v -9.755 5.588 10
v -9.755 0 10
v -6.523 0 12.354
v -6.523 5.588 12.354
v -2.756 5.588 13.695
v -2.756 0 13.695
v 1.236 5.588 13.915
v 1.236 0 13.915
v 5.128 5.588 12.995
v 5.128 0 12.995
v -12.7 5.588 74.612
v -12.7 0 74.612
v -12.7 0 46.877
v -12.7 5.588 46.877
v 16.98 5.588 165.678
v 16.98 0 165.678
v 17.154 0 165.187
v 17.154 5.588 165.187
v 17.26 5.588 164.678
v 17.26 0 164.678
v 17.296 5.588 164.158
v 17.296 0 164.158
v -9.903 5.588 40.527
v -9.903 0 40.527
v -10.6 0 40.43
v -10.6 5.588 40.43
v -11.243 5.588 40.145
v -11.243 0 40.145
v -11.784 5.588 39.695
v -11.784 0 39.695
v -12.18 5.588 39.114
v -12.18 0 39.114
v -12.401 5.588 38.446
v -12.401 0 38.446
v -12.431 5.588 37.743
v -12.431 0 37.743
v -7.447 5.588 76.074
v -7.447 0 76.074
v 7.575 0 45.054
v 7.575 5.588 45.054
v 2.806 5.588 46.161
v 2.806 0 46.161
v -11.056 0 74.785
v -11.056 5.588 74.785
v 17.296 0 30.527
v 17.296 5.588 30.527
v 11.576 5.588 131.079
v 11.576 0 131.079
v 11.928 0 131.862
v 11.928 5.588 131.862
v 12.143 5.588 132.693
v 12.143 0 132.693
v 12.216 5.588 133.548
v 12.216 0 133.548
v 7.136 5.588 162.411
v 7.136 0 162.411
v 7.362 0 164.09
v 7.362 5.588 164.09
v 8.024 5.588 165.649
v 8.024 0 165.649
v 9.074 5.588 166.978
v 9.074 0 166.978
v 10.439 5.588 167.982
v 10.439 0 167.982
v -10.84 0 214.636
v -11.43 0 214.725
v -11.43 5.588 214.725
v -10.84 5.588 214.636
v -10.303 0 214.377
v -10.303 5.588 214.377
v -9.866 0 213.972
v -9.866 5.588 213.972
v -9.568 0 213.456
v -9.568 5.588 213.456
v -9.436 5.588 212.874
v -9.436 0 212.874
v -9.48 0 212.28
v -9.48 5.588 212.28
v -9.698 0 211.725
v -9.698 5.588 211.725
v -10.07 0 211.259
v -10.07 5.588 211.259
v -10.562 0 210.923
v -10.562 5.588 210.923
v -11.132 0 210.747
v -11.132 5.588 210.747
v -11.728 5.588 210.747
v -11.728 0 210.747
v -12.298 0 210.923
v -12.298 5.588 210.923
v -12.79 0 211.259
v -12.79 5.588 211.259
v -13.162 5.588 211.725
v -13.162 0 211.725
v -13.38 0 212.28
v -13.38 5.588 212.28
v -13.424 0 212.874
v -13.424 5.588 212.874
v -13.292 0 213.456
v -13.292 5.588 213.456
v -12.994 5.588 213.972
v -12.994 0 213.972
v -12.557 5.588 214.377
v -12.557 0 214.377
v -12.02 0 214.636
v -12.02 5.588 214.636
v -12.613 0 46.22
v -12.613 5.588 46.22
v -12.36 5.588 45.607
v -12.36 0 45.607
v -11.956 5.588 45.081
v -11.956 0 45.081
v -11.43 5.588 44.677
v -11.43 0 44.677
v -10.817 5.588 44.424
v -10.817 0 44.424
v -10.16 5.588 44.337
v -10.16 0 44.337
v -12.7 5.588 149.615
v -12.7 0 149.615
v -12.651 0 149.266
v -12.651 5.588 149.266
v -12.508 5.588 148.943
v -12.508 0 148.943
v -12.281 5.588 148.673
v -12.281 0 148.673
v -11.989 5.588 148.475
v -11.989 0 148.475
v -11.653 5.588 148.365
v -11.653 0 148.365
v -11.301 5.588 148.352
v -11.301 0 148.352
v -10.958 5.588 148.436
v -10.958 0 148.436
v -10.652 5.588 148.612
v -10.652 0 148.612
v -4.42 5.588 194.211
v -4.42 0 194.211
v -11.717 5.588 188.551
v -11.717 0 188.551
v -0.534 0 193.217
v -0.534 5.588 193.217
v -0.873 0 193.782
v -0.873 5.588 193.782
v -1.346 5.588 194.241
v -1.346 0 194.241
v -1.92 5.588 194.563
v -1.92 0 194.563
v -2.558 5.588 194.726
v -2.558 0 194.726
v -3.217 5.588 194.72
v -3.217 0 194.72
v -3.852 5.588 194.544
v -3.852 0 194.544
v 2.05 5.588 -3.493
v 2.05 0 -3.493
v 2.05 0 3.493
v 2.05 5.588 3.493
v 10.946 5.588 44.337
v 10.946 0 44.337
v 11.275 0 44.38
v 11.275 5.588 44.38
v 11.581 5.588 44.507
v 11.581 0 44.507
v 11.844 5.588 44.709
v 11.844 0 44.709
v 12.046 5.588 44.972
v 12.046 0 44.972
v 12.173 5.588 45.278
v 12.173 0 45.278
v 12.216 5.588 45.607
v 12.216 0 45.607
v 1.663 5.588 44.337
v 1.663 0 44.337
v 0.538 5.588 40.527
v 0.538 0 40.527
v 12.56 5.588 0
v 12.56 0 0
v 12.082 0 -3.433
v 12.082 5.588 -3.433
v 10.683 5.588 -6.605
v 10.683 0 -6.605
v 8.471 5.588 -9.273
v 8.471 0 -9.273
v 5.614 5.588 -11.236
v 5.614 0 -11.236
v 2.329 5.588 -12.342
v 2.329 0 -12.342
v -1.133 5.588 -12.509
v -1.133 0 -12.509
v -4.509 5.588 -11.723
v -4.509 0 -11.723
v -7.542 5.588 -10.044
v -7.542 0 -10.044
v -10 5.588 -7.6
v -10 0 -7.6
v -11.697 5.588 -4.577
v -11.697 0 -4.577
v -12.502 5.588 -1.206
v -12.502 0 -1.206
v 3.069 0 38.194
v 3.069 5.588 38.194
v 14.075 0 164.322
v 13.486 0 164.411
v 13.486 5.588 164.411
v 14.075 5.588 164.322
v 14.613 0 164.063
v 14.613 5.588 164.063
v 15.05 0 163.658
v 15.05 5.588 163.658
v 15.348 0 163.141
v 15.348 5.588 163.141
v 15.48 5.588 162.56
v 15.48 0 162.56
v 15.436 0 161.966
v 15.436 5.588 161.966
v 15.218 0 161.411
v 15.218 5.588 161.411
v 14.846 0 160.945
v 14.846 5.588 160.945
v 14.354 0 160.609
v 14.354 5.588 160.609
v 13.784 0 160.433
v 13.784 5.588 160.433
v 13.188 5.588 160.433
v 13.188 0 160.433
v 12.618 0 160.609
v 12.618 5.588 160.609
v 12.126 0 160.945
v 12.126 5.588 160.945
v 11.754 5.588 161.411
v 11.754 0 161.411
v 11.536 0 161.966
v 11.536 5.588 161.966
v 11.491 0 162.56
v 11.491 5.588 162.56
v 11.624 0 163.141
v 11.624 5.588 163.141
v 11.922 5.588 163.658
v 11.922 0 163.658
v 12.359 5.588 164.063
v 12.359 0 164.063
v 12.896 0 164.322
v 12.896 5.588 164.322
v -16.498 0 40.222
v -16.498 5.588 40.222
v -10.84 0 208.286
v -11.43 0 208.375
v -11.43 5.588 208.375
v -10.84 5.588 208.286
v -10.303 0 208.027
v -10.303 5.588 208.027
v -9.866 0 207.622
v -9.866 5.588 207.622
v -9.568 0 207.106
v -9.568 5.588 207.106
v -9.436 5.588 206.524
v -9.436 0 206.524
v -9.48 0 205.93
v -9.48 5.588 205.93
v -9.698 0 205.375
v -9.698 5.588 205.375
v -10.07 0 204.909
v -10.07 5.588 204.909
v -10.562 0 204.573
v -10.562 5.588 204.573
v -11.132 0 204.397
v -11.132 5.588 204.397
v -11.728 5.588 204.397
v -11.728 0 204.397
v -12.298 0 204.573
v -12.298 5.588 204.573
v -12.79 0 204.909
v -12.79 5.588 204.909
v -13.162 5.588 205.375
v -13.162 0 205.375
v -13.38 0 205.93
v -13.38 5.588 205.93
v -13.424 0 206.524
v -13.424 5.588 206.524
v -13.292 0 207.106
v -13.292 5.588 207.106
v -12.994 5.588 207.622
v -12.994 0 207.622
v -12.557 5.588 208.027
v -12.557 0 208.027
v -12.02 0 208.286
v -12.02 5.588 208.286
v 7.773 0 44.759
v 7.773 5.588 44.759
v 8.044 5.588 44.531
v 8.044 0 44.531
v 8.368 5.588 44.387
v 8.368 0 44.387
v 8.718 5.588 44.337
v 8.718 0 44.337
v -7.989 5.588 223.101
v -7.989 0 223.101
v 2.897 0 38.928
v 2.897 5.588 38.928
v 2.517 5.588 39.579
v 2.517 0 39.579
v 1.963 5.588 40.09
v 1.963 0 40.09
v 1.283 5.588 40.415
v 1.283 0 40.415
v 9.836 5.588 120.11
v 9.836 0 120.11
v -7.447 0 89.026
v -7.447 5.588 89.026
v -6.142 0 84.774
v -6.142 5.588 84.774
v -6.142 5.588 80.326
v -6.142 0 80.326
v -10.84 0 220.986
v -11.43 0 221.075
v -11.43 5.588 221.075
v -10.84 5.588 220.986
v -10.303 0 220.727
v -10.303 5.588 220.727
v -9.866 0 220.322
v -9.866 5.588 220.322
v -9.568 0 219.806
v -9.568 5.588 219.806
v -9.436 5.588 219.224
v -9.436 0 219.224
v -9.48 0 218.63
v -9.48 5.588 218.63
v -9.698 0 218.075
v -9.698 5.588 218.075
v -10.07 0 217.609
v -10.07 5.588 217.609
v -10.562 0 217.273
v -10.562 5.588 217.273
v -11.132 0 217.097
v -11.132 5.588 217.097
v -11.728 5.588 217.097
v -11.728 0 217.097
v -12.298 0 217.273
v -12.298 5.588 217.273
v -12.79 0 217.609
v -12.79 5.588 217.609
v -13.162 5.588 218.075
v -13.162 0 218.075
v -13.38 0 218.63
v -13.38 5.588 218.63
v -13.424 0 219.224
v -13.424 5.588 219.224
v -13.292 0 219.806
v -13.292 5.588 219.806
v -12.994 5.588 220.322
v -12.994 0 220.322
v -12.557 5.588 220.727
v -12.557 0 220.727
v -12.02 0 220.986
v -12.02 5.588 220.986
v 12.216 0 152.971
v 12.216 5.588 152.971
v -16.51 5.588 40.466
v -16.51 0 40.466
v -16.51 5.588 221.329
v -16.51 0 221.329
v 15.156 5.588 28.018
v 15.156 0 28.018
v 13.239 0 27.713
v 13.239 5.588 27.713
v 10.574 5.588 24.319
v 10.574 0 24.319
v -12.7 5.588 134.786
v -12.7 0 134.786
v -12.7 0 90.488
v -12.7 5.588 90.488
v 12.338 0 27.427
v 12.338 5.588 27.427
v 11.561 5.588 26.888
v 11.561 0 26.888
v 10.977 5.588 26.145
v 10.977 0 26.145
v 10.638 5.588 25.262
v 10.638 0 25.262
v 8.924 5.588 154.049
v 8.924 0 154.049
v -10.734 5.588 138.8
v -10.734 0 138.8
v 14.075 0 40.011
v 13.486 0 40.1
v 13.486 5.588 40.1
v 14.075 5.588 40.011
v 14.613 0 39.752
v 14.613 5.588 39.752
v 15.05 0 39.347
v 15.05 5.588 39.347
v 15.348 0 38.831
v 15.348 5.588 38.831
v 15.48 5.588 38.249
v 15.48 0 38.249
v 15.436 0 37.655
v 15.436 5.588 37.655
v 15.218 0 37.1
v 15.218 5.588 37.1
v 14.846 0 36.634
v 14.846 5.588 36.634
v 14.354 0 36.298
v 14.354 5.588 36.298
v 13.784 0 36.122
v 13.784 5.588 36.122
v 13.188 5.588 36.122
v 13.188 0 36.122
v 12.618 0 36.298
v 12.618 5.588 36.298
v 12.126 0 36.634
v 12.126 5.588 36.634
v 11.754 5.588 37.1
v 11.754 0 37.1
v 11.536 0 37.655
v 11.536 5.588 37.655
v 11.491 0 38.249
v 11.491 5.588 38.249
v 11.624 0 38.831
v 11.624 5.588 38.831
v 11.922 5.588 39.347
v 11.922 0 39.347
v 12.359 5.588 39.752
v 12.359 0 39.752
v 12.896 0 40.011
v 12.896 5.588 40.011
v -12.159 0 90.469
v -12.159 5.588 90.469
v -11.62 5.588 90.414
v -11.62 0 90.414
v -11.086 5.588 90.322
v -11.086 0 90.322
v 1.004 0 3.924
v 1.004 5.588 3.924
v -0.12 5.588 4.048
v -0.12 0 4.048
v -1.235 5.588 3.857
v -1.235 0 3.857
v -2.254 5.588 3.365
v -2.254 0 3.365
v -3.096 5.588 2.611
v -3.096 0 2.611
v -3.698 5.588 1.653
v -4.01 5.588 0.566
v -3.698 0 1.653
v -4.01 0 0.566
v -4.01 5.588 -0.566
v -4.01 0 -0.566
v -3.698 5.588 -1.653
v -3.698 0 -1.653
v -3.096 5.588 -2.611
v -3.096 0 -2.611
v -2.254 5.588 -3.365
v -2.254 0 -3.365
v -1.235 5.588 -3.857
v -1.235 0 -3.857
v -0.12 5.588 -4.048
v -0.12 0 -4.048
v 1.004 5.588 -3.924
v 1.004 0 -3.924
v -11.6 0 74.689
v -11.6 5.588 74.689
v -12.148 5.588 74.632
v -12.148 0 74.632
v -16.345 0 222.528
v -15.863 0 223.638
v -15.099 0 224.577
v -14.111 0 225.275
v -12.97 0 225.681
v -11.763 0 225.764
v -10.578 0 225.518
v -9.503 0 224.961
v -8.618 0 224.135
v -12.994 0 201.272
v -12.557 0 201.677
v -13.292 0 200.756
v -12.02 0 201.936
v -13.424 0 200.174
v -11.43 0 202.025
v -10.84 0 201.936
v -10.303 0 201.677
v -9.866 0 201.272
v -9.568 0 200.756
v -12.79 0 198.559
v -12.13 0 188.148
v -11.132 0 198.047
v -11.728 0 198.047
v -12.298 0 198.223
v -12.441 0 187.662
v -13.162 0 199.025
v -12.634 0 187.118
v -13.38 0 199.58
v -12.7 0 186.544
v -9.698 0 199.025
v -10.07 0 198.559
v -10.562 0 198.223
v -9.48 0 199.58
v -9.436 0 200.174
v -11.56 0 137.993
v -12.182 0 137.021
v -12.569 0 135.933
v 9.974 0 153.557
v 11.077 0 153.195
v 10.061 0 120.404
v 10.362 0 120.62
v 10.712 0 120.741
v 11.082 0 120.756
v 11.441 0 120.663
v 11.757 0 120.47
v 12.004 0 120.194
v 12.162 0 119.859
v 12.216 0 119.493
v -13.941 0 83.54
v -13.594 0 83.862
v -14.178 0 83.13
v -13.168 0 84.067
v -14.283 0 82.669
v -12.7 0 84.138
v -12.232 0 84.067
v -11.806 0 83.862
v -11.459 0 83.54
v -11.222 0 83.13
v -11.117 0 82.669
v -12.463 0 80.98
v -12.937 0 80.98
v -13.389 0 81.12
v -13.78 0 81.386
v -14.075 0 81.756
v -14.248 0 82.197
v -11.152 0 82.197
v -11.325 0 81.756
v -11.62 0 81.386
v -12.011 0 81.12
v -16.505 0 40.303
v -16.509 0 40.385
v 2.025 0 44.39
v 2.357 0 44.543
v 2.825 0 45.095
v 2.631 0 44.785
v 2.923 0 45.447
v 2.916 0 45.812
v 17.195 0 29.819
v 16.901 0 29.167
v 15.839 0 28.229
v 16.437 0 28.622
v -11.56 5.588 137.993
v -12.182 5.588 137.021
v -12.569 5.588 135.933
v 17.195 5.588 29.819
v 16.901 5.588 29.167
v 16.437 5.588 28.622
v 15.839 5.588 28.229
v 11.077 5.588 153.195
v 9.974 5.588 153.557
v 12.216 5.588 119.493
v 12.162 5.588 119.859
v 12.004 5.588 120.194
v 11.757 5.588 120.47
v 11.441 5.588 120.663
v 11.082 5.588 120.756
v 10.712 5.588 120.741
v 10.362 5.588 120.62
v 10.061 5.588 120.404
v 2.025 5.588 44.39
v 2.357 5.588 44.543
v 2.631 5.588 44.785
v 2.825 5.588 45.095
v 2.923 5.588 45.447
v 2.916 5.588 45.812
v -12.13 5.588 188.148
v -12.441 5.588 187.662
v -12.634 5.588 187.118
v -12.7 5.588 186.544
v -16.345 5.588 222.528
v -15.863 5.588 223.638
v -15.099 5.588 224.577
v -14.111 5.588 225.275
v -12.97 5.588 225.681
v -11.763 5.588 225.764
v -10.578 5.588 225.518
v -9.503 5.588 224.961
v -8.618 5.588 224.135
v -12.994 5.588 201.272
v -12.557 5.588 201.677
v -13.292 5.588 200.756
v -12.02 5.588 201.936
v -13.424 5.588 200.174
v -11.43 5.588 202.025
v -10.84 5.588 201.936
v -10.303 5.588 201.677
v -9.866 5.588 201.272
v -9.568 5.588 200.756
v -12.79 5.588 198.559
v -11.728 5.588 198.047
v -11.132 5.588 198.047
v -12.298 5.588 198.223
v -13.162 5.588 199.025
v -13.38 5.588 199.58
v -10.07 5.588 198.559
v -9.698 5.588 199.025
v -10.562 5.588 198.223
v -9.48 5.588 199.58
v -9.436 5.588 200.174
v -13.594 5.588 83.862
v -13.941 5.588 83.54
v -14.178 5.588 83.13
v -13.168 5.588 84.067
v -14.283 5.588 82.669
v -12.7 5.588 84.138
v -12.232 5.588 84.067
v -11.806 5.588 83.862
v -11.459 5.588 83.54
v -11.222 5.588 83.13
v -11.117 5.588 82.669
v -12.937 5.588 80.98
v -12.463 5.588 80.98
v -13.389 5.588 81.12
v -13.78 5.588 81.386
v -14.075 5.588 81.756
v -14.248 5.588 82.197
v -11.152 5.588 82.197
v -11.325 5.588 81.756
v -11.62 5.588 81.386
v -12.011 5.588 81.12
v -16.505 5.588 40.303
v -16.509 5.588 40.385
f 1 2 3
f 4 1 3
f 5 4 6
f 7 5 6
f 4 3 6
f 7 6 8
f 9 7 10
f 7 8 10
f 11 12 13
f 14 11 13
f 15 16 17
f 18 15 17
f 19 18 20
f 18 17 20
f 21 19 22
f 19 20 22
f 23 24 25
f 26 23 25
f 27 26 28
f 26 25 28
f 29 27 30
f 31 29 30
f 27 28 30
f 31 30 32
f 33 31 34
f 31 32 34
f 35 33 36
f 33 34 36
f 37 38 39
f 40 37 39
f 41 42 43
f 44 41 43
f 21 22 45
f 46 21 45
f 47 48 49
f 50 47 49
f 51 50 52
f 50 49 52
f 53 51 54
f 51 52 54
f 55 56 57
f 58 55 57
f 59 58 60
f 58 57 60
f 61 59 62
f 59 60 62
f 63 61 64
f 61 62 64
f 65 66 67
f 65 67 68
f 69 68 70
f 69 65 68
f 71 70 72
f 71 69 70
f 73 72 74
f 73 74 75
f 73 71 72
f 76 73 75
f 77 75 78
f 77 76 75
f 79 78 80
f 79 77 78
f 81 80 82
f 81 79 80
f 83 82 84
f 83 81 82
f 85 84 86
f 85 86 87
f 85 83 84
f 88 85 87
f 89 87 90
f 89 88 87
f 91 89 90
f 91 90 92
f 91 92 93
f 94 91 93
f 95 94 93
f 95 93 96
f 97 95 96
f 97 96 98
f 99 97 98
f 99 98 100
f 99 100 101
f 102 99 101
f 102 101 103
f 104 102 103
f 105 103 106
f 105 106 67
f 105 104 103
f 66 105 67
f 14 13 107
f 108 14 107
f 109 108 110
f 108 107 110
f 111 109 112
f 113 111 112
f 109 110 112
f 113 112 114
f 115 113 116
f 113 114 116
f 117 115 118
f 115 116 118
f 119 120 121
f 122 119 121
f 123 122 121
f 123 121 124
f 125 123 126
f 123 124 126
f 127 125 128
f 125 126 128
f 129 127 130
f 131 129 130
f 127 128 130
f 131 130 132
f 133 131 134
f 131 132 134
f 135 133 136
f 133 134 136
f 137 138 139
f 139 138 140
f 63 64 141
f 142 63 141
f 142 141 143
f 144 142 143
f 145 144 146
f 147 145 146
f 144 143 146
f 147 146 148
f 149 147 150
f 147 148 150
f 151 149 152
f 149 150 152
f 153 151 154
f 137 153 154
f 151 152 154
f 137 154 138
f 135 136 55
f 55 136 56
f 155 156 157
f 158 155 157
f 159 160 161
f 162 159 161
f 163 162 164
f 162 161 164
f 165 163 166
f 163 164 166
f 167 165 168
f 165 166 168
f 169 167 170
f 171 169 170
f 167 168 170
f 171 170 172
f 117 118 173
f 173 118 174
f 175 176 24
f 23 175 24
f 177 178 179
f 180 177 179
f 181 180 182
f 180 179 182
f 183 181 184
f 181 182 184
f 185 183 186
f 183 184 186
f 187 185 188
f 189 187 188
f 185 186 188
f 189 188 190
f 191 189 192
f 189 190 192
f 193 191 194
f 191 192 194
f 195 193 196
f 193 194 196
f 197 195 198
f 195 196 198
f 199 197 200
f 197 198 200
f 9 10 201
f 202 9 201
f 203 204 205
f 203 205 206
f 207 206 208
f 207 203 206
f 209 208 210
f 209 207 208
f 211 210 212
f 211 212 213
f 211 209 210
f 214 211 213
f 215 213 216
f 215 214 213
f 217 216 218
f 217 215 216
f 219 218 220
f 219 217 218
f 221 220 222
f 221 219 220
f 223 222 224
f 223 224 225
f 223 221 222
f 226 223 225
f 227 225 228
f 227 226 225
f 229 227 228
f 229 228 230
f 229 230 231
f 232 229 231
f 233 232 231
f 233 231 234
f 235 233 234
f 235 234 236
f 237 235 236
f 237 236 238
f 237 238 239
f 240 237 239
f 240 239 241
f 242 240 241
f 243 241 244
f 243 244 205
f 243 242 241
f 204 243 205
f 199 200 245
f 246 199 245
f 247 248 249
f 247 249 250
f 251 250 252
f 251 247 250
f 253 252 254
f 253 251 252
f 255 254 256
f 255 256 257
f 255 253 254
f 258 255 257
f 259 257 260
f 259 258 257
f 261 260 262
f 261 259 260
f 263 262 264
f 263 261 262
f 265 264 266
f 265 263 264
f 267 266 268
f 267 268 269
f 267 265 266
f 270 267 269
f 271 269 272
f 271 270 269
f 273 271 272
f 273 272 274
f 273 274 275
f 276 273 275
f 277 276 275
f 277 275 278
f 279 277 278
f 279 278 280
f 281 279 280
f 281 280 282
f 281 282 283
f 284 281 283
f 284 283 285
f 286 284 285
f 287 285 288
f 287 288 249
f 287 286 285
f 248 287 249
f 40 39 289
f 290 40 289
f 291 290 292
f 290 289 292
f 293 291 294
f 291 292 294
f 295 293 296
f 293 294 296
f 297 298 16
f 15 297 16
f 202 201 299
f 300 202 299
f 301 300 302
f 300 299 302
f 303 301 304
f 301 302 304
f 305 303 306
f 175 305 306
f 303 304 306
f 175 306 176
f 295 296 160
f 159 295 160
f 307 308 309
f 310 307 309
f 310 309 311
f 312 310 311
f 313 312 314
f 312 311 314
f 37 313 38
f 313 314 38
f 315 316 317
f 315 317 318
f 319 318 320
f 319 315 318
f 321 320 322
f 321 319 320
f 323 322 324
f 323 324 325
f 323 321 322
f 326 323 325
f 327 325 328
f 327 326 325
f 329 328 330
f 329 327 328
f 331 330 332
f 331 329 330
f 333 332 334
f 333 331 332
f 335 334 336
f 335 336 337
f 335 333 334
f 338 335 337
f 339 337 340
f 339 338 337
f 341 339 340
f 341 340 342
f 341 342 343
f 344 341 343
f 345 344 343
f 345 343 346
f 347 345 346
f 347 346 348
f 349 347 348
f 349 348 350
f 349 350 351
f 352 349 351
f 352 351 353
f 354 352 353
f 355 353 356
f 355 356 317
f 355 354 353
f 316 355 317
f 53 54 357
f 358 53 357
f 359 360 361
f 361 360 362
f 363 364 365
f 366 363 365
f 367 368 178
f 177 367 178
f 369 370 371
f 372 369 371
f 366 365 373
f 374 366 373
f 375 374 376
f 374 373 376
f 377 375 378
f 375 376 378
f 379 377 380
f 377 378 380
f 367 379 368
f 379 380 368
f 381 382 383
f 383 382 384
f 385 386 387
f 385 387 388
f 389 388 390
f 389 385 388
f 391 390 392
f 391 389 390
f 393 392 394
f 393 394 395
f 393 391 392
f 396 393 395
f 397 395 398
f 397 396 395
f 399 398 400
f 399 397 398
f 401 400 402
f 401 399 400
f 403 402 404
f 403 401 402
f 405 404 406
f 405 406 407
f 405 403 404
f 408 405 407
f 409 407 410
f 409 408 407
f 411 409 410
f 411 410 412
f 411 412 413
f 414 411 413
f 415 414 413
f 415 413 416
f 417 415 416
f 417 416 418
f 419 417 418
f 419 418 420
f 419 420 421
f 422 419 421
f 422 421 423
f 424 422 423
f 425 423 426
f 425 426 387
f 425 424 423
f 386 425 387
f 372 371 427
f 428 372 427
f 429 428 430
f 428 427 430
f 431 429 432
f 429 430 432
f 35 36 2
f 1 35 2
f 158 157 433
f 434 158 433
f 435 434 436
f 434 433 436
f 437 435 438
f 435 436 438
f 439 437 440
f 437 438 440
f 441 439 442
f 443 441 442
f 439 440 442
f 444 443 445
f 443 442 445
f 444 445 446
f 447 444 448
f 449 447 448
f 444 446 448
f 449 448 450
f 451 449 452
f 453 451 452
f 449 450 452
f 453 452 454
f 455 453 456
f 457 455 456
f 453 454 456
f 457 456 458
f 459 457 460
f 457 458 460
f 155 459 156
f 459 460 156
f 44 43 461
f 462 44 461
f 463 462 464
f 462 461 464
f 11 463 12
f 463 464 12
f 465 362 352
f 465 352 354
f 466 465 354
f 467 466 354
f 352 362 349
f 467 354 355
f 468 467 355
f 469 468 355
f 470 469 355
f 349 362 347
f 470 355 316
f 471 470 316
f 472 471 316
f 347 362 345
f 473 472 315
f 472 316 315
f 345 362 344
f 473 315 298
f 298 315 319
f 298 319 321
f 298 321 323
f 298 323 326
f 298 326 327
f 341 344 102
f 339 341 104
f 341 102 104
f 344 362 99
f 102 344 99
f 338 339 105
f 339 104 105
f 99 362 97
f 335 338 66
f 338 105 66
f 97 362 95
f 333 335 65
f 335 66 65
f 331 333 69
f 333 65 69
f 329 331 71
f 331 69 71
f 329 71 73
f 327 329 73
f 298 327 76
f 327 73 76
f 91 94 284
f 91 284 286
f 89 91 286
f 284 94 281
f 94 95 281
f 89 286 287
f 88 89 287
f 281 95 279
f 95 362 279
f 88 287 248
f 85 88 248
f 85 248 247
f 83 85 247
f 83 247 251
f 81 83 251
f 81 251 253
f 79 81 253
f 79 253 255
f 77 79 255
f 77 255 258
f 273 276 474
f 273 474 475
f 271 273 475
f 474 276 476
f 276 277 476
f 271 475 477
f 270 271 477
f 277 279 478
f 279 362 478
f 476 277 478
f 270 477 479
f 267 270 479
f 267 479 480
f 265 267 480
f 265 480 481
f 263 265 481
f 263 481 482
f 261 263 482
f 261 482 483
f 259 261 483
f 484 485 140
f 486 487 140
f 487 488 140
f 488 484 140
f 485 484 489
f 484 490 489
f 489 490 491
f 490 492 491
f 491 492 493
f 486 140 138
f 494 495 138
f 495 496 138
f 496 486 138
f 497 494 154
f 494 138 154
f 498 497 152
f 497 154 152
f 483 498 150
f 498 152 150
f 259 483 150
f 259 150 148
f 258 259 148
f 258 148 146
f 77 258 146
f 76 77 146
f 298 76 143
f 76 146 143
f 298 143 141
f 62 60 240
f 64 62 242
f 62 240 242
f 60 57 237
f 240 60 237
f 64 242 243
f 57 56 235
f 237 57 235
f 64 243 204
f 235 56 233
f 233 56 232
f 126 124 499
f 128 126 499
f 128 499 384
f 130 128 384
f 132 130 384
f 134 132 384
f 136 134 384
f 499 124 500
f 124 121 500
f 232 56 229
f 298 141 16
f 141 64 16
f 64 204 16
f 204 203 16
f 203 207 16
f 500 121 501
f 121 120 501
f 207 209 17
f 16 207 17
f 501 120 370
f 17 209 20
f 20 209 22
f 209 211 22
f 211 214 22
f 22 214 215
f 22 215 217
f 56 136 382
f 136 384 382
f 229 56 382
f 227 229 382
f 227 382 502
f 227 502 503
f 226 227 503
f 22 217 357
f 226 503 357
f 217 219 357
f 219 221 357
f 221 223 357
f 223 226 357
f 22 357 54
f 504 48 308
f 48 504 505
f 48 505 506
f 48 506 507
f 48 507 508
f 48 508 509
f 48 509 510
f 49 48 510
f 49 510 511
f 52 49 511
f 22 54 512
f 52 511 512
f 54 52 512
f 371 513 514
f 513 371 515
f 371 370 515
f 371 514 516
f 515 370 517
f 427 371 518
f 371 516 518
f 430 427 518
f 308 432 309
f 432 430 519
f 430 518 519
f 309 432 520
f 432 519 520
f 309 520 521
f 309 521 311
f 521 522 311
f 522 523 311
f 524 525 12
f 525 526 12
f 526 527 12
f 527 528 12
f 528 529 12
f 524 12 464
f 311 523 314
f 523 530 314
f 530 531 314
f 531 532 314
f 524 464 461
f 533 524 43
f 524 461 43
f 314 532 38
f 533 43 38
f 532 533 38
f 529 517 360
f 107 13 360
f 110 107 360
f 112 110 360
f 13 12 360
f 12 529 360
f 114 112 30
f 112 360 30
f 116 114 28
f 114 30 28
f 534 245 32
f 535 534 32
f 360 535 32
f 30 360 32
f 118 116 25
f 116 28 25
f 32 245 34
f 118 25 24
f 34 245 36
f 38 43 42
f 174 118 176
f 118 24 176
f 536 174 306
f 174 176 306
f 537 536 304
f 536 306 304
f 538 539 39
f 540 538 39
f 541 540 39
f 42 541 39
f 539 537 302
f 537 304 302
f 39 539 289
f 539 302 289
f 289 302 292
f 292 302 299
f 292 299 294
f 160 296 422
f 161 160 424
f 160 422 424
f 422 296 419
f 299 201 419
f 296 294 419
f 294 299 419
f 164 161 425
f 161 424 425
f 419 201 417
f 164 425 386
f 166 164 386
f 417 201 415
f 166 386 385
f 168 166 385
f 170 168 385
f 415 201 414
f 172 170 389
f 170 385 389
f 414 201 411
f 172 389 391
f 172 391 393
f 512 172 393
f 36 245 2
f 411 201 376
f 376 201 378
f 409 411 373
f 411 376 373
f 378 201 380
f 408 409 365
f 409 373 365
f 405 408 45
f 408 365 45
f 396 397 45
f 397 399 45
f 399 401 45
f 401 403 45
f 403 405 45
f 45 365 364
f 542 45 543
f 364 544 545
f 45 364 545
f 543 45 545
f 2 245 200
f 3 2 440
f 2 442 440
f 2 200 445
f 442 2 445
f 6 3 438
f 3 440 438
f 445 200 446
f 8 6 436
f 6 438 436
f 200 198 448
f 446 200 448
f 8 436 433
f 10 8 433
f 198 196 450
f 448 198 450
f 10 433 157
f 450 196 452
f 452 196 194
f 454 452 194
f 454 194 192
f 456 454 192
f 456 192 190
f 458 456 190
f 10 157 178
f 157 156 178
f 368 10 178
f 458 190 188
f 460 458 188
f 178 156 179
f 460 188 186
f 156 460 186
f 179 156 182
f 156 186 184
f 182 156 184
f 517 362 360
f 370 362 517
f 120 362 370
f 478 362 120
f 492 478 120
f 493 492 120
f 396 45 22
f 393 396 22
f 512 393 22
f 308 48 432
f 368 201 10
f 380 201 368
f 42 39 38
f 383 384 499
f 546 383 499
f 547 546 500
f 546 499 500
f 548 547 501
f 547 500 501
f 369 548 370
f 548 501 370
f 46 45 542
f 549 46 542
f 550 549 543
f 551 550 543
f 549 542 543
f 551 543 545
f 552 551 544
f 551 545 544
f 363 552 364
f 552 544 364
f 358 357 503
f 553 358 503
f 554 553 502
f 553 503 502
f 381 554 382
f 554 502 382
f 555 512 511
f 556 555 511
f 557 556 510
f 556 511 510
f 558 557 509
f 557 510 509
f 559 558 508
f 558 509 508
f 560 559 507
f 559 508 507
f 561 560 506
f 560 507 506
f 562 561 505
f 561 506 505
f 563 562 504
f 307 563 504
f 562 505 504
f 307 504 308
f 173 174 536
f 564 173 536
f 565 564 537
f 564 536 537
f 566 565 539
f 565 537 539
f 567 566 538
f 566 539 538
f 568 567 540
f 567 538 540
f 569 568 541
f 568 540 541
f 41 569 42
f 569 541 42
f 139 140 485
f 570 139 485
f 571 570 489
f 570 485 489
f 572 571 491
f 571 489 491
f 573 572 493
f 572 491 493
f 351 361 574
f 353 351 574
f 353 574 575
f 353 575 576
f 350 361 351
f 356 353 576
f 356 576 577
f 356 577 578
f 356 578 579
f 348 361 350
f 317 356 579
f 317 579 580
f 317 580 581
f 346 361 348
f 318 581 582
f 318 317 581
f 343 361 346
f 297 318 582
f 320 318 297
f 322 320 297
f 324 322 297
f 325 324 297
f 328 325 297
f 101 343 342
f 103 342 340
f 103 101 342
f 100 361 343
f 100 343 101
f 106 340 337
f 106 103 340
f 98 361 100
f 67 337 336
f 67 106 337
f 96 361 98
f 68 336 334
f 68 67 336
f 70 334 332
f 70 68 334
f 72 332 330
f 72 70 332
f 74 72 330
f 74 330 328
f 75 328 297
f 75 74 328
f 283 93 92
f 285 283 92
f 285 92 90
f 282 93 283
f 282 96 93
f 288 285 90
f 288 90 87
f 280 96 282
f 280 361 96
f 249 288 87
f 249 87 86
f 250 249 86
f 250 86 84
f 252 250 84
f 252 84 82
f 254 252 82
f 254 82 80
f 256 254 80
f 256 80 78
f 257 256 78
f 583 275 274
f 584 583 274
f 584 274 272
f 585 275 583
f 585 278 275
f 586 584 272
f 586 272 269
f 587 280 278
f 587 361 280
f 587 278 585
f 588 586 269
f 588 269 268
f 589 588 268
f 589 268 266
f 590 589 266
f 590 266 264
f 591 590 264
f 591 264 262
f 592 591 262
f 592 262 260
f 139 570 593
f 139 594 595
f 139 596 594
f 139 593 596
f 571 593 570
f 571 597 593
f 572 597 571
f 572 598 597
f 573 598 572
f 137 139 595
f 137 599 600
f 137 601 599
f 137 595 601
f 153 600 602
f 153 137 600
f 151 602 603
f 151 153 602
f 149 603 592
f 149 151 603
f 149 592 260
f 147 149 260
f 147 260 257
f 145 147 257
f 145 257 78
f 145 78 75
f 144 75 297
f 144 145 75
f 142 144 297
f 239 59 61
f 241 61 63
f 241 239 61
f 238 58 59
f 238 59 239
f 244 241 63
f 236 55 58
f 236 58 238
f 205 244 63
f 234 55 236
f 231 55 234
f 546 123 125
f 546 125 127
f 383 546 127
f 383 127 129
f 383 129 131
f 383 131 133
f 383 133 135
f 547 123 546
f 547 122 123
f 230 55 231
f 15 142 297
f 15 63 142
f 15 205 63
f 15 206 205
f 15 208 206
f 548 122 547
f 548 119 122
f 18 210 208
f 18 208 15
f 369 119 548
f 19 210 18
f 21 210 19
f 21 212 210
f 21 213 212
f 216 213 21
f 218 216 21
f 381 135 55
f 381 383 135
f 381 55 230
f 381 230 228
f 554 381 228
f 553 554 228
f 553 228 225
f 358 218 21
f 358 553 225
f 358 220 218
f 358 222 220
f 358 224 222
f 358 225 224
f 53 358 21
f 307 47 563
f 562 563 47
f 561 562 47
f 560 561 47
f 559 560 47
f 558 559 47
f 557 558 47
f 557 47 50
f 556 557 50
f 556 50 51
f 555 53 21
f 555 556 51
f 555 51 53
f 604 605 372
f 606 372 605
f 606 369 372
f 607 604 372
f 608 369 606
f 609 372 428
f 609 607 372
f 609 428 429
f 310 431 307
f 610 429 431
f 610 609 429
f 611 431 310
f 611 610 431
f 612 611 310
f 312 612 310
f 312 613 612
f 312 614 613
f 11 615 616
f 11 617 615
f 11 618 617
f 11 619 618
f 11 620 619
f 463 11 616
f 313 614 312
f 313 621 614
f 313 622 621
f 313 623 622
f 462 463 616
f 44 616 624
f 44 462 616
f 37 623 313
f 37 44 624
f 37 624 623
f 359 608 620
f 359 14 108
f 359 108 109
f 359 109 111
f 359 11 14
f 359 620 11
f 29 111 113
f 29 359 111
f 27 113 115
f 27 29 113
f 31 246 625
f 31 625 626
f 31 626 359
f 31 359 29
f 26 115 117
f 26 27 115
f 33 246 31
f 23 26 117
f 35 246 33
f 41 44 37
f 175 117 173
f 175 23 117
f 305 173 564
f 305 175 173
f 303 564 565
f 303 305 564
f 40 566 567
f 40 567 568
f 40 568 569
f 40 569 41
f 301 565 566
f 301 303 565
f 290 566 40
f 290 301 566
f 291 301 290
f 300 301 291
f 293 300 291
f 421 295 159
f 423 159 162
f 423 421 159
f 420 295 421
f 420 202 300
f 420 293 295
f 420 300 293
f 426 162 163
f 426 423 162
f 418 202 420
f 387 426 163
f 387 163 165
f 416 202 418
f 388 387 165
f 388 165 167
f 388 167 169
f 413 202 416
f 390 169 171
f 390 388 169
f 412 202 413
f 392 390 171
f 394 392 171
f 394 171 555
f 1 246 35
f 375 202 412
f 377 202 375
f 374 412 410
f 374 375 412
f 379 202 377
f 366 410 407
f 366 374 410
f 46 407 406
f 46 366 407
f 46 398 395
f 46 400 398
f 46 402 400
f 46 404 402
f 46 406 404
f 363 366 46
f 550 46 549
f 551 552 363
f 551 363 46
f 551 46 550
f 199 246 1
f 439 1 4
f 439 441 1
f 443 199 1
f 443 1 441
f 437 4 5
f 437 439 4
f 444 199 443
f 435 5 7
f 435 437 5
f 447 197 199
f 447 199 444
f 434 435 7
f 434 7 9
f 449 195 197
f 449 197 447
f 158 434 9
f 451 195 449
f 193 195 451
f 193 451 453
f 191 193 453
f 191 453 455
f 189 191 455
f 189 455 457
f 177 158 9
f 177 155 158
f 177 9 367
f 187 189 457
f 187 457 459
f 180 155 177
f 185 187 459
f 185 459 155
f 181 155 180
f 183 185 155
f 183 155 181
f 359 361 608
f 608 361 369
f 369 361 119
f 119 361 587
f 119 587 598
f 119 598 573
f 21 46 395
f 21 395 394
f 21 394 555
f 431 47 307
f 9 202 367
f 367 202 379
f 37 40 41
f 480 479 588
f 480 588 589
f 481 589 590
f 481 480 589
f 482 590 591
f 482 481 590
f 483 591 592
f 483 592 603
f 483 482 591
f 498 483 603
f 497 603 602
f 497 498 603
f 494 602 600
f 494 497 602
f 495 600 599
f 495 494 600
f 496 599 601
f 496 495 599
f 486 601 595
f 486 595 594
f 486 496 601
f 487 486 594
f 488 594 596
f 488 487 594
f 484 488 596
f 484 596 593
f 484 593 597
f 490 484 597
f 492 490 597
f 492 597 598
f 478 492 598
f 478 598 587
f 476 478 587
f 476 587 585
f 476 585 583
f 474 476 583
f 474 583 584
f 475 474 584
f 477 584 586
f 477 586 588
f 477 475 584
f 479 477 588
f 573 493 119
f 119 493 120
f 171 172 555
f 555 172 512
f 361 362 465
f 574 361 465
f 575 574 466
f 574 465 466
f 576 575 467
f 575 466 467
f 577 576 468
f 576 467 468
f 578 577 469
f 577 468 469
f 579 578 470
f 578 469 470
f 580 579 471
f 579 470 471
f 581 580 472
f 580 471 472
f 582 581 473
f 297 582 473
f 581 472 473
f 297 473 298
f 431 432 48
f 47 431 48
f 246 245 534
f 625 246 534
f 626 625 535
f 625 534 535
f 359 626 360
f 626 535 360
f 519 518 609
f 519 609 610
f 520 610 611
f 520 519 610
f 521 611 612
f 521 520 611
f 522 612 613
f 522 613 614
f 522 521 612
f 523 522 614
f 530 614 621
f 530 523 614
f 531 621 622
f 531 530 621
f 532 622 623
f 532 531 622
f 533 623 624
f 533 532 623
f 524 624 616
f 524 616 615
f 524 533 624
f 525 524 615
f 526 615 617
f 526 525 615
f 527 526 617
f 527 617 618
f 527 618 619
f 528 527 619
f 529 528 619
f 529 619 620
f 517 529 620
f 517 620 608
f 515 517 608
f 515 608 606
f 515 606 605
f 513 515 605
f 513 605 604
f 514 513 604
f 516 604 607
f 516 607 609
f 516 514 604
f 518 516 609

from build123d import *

# Parameters (mm, degrees)
SKETCH2_R           = 2
SKETCH2_R_2         = 1.5875
SKETCH2_R_3         = 1.999999991
BOSS_EXTRUDE1_DEPTH = 5.588


with BuildPart() as part:
    # Sketch2 → Boss-Extrude1 (new body)
    with BuildSketch(Plane(origin=(0, 0, 0), x_dir=(1, 0, 0), z_dir=(0, 1, 0))):
        with BuildLine():
            ThreePointArc((17.295902343, -30.526810701), (16.688093876, -28.878103365), (15.15555913, -28.018449791))
            Line((15.15555913, -28.018449791), (13.238676936, -27.713033224))
            ThreePointArc((13.238676936, -27.713033224), (11.241051513, -26.538356195), (10.573787778, -24.319092227))
            Line((10.573787778, -24.319092227), (12.5603, 0))
            ThreePointArc((12.5603, 0), (0.603657177, 12.545785512), (-12.502275592, 1.2059192))
            Line((-12.502275592, 1.2059192), (-16.498266045, -40.222207921))
            ThreePointArc((-16.498266045, -40.222207921), (-16.507064815, -40.344000039), (-16.51, -40.466074291))
            Line((-16.51, -40.466074291), (-16.51, -221.328861788))
            ThreePointArc((-16.51, -221.328861788), (-12.970187584, -225.680718913), (-7.988667969, -223.101301399))
            Line((-7.988667969, -223.101301399), (16.979901226, -165.677523619))
            ThreePointArc((16.979901226, -165.677523619), (17.216065593, -164.934164738), (17.295902343, -164.158289667))
            Line((17.295902343, -164.158289667), (17.295902343, -30.526810701))
        make_face()
        with Locations(Location((-11.43, -219.075, 0), (0, 0, 270))):
            Circle(SKETCH2_R, mode=Mode.SUBTRACT)
        with Locations(Location((-11.43, -212.725, 0), (0, 0, 270))):
            Circle(SKETCH2_R, mode=Mode.SUBTRACT)
        with Locations(Location((-11.43, -206.375, 0), (0, 0, 270))):
            Circle(SKETCH2_R, mode=Mode.SUBTRACT)
        with Locations(Location((-11.43, -200.025, 0), (0, 0, 270))):
            Circle(SKETCH2_R, mode=Mode.SUBTRACT)
        with BuildLine():
            ThreePointArc((7.135902343, -162.410770806), (8.023611961, -165.648962244), (10.438542905, -167.981776143))
            Line((10.438542905, -167.981776143), (-0.534170778, -193.217289931))
            ThreePointArc((-0.534170778, -193.217289931), (-2.234040931, -194.665234867), (-4.420389569, -194.211381682))
            Line((-4.420389569, -194.211381682), (-11.716886202, -188.551043102))
            ThreePointArc((-11.716886202, -188.551043102), (-12.441018517, -187.661516081), (-12.7, -186.544128716))
            Line((-12.7, -186.544128716), (-12.7, -149.615408258))
            ThreePointArc((-12.7, -149.615408258), (-11.988693683, -148.474898999), (-10.651556899, -148.611951065))
            Line((-10.651556899, -148.611951065), (7.135902343, -162.410770806))
        make_face(mode=Mode.SUBTRACT)
        with BuildLine():
            ThreePointArc((12.215902343, -152.970817152), (10.520298026, -153.359206519), (8.923603828, -154.049487576))
            Line((8.923603828, -154.049487576), (-10.733772403, -138.80005889))
            ThreePointArc((-10.733772403, -138.80005889), (-12.182037035, -137.021004847), (-12.7, -134.786230117))
            Line((-12.7, -134.786230117), (-12.7, -90.4875))
            ThreePointArc((-12.7, -90.4875), (-11.888769677, -90.445936399), (-11.086035141, -90.321680879))
            Line((-11.086035141, -90.321680879), (11.575760855, -131.079432803))
            ThreePointArc((11.575760855, -131.079432803), (12.053263487, -132.272915946), (12.215902343, -133.548047069))
            Line((12.215902343, -133.548047069), (12.215902343, -152.970817152))
        make_face(mode=Mode.SUBTRACT)
        with Locations(Location((13.485902343, -162.410770806, 0), (0, 0, 270))):
            Circle(SKETCH2_R, mode=Mode.SUBTRACT)
        with Locations(Location((-12.7, -82.55, 0), (0, 0, 270))):
            Circle(SKETCH2_R_2, mode=Mode.SUBTRACT)
        with BuildLine():
            Line((-10.16, -44.337182032), (1.663048834, -44.337182032))
            ThreePointArc((1.663048834, -44.337182032), (2.739129831, -44.932682449), (2.806066447, -46.160725831))
            Line((2.806066447, -46.160725831), (-11.055993219, -74.784618621))
            ThreePointArc((-11.055993219, -74.784618621), (-11.873503915, -74.655646925), (-12.7, -74.6125))
            Line((-12.7, -74.6125), (-12.7, -46.877182032))
            ThreePointArc((-12.7, -46.877182032), (-11.956051224, -45.081130808), (-10.16, -44.337182032))
        make_face(mode=Mode.SUBTRACT)
        with BuildLine():
            ThreePointArc((-9.903213406, -40.527182032), (-11.783508673, -39.694838236), (-12.431479451, -37.743315662))
            Line((-12.431479451, -37.743315662), (-9.755434212, -9.99962016))
            ThreePointArc((-9.755434212, -9.99962016), (-2.756273581, -13.695395429), (5.127655889, -12.99492382))
            Line((5.127655889, -12.99492382), (3.069264048, -38.19397392))
            ThreePointArc((3.069264048, -38.19397392), (2.259083254, -39.854914801), (0.537695935, -40.527182032))
            Line((0.537695935, -40.527182032), (-9.903213406, -40.527182032))
        make_face(mode=Mode.SUBTRACT)
        with BuildLine():
            ThreePointArc((2.05, -3.492849839), (-4.05, 0), (2.05, 3.492849839))
            Line((2.05, 3.492849839), (2.05, -3.492849839))
        make_face(mode=Mode.SUBTRACT)
        with BuildLine():
            ThreePointArc((-7.44734835, -89.025591197), (-5.976040897, -82.55), (-7.44734835, -76.074408803))
            Line((-7.44734835, -76.074408803), (7.575478058, -45.053638233))
            ThreePointArc((7.575478058, -45.053638233), (8.043996088, -44.531101035), (8.718495671, -44.337182032))
            Line((8.718495671, -44.337182032), (10.945902343, -44.337182032))
            ThreePointArc((10.945902343, -44.337182032), (11.843927955, -44.70915642), (12.215902343, -45.607182032))
            Line((12.215902343, -45.607182032), (12.215902343, -119.492817968))
            ThreePointArc((12.215902343, -119.492817968), (11.264685124, -120.722158254), (9.835937715, -120.109971535))
            Line((9.835937715, -120.109971535), (-7.44734835, -89.025591197))
        make_face(mode=Mode.SUBTRACT)
        with Locations(Location((13.485902343, -38.1, 0), (0, 0, 270))):
            Circle(SKETCH2_R_3, mode=Mode.SUBTRACT)
    extrude(amount=BOSS_EXTRUDE1_DEPTH)


solid = part.part
